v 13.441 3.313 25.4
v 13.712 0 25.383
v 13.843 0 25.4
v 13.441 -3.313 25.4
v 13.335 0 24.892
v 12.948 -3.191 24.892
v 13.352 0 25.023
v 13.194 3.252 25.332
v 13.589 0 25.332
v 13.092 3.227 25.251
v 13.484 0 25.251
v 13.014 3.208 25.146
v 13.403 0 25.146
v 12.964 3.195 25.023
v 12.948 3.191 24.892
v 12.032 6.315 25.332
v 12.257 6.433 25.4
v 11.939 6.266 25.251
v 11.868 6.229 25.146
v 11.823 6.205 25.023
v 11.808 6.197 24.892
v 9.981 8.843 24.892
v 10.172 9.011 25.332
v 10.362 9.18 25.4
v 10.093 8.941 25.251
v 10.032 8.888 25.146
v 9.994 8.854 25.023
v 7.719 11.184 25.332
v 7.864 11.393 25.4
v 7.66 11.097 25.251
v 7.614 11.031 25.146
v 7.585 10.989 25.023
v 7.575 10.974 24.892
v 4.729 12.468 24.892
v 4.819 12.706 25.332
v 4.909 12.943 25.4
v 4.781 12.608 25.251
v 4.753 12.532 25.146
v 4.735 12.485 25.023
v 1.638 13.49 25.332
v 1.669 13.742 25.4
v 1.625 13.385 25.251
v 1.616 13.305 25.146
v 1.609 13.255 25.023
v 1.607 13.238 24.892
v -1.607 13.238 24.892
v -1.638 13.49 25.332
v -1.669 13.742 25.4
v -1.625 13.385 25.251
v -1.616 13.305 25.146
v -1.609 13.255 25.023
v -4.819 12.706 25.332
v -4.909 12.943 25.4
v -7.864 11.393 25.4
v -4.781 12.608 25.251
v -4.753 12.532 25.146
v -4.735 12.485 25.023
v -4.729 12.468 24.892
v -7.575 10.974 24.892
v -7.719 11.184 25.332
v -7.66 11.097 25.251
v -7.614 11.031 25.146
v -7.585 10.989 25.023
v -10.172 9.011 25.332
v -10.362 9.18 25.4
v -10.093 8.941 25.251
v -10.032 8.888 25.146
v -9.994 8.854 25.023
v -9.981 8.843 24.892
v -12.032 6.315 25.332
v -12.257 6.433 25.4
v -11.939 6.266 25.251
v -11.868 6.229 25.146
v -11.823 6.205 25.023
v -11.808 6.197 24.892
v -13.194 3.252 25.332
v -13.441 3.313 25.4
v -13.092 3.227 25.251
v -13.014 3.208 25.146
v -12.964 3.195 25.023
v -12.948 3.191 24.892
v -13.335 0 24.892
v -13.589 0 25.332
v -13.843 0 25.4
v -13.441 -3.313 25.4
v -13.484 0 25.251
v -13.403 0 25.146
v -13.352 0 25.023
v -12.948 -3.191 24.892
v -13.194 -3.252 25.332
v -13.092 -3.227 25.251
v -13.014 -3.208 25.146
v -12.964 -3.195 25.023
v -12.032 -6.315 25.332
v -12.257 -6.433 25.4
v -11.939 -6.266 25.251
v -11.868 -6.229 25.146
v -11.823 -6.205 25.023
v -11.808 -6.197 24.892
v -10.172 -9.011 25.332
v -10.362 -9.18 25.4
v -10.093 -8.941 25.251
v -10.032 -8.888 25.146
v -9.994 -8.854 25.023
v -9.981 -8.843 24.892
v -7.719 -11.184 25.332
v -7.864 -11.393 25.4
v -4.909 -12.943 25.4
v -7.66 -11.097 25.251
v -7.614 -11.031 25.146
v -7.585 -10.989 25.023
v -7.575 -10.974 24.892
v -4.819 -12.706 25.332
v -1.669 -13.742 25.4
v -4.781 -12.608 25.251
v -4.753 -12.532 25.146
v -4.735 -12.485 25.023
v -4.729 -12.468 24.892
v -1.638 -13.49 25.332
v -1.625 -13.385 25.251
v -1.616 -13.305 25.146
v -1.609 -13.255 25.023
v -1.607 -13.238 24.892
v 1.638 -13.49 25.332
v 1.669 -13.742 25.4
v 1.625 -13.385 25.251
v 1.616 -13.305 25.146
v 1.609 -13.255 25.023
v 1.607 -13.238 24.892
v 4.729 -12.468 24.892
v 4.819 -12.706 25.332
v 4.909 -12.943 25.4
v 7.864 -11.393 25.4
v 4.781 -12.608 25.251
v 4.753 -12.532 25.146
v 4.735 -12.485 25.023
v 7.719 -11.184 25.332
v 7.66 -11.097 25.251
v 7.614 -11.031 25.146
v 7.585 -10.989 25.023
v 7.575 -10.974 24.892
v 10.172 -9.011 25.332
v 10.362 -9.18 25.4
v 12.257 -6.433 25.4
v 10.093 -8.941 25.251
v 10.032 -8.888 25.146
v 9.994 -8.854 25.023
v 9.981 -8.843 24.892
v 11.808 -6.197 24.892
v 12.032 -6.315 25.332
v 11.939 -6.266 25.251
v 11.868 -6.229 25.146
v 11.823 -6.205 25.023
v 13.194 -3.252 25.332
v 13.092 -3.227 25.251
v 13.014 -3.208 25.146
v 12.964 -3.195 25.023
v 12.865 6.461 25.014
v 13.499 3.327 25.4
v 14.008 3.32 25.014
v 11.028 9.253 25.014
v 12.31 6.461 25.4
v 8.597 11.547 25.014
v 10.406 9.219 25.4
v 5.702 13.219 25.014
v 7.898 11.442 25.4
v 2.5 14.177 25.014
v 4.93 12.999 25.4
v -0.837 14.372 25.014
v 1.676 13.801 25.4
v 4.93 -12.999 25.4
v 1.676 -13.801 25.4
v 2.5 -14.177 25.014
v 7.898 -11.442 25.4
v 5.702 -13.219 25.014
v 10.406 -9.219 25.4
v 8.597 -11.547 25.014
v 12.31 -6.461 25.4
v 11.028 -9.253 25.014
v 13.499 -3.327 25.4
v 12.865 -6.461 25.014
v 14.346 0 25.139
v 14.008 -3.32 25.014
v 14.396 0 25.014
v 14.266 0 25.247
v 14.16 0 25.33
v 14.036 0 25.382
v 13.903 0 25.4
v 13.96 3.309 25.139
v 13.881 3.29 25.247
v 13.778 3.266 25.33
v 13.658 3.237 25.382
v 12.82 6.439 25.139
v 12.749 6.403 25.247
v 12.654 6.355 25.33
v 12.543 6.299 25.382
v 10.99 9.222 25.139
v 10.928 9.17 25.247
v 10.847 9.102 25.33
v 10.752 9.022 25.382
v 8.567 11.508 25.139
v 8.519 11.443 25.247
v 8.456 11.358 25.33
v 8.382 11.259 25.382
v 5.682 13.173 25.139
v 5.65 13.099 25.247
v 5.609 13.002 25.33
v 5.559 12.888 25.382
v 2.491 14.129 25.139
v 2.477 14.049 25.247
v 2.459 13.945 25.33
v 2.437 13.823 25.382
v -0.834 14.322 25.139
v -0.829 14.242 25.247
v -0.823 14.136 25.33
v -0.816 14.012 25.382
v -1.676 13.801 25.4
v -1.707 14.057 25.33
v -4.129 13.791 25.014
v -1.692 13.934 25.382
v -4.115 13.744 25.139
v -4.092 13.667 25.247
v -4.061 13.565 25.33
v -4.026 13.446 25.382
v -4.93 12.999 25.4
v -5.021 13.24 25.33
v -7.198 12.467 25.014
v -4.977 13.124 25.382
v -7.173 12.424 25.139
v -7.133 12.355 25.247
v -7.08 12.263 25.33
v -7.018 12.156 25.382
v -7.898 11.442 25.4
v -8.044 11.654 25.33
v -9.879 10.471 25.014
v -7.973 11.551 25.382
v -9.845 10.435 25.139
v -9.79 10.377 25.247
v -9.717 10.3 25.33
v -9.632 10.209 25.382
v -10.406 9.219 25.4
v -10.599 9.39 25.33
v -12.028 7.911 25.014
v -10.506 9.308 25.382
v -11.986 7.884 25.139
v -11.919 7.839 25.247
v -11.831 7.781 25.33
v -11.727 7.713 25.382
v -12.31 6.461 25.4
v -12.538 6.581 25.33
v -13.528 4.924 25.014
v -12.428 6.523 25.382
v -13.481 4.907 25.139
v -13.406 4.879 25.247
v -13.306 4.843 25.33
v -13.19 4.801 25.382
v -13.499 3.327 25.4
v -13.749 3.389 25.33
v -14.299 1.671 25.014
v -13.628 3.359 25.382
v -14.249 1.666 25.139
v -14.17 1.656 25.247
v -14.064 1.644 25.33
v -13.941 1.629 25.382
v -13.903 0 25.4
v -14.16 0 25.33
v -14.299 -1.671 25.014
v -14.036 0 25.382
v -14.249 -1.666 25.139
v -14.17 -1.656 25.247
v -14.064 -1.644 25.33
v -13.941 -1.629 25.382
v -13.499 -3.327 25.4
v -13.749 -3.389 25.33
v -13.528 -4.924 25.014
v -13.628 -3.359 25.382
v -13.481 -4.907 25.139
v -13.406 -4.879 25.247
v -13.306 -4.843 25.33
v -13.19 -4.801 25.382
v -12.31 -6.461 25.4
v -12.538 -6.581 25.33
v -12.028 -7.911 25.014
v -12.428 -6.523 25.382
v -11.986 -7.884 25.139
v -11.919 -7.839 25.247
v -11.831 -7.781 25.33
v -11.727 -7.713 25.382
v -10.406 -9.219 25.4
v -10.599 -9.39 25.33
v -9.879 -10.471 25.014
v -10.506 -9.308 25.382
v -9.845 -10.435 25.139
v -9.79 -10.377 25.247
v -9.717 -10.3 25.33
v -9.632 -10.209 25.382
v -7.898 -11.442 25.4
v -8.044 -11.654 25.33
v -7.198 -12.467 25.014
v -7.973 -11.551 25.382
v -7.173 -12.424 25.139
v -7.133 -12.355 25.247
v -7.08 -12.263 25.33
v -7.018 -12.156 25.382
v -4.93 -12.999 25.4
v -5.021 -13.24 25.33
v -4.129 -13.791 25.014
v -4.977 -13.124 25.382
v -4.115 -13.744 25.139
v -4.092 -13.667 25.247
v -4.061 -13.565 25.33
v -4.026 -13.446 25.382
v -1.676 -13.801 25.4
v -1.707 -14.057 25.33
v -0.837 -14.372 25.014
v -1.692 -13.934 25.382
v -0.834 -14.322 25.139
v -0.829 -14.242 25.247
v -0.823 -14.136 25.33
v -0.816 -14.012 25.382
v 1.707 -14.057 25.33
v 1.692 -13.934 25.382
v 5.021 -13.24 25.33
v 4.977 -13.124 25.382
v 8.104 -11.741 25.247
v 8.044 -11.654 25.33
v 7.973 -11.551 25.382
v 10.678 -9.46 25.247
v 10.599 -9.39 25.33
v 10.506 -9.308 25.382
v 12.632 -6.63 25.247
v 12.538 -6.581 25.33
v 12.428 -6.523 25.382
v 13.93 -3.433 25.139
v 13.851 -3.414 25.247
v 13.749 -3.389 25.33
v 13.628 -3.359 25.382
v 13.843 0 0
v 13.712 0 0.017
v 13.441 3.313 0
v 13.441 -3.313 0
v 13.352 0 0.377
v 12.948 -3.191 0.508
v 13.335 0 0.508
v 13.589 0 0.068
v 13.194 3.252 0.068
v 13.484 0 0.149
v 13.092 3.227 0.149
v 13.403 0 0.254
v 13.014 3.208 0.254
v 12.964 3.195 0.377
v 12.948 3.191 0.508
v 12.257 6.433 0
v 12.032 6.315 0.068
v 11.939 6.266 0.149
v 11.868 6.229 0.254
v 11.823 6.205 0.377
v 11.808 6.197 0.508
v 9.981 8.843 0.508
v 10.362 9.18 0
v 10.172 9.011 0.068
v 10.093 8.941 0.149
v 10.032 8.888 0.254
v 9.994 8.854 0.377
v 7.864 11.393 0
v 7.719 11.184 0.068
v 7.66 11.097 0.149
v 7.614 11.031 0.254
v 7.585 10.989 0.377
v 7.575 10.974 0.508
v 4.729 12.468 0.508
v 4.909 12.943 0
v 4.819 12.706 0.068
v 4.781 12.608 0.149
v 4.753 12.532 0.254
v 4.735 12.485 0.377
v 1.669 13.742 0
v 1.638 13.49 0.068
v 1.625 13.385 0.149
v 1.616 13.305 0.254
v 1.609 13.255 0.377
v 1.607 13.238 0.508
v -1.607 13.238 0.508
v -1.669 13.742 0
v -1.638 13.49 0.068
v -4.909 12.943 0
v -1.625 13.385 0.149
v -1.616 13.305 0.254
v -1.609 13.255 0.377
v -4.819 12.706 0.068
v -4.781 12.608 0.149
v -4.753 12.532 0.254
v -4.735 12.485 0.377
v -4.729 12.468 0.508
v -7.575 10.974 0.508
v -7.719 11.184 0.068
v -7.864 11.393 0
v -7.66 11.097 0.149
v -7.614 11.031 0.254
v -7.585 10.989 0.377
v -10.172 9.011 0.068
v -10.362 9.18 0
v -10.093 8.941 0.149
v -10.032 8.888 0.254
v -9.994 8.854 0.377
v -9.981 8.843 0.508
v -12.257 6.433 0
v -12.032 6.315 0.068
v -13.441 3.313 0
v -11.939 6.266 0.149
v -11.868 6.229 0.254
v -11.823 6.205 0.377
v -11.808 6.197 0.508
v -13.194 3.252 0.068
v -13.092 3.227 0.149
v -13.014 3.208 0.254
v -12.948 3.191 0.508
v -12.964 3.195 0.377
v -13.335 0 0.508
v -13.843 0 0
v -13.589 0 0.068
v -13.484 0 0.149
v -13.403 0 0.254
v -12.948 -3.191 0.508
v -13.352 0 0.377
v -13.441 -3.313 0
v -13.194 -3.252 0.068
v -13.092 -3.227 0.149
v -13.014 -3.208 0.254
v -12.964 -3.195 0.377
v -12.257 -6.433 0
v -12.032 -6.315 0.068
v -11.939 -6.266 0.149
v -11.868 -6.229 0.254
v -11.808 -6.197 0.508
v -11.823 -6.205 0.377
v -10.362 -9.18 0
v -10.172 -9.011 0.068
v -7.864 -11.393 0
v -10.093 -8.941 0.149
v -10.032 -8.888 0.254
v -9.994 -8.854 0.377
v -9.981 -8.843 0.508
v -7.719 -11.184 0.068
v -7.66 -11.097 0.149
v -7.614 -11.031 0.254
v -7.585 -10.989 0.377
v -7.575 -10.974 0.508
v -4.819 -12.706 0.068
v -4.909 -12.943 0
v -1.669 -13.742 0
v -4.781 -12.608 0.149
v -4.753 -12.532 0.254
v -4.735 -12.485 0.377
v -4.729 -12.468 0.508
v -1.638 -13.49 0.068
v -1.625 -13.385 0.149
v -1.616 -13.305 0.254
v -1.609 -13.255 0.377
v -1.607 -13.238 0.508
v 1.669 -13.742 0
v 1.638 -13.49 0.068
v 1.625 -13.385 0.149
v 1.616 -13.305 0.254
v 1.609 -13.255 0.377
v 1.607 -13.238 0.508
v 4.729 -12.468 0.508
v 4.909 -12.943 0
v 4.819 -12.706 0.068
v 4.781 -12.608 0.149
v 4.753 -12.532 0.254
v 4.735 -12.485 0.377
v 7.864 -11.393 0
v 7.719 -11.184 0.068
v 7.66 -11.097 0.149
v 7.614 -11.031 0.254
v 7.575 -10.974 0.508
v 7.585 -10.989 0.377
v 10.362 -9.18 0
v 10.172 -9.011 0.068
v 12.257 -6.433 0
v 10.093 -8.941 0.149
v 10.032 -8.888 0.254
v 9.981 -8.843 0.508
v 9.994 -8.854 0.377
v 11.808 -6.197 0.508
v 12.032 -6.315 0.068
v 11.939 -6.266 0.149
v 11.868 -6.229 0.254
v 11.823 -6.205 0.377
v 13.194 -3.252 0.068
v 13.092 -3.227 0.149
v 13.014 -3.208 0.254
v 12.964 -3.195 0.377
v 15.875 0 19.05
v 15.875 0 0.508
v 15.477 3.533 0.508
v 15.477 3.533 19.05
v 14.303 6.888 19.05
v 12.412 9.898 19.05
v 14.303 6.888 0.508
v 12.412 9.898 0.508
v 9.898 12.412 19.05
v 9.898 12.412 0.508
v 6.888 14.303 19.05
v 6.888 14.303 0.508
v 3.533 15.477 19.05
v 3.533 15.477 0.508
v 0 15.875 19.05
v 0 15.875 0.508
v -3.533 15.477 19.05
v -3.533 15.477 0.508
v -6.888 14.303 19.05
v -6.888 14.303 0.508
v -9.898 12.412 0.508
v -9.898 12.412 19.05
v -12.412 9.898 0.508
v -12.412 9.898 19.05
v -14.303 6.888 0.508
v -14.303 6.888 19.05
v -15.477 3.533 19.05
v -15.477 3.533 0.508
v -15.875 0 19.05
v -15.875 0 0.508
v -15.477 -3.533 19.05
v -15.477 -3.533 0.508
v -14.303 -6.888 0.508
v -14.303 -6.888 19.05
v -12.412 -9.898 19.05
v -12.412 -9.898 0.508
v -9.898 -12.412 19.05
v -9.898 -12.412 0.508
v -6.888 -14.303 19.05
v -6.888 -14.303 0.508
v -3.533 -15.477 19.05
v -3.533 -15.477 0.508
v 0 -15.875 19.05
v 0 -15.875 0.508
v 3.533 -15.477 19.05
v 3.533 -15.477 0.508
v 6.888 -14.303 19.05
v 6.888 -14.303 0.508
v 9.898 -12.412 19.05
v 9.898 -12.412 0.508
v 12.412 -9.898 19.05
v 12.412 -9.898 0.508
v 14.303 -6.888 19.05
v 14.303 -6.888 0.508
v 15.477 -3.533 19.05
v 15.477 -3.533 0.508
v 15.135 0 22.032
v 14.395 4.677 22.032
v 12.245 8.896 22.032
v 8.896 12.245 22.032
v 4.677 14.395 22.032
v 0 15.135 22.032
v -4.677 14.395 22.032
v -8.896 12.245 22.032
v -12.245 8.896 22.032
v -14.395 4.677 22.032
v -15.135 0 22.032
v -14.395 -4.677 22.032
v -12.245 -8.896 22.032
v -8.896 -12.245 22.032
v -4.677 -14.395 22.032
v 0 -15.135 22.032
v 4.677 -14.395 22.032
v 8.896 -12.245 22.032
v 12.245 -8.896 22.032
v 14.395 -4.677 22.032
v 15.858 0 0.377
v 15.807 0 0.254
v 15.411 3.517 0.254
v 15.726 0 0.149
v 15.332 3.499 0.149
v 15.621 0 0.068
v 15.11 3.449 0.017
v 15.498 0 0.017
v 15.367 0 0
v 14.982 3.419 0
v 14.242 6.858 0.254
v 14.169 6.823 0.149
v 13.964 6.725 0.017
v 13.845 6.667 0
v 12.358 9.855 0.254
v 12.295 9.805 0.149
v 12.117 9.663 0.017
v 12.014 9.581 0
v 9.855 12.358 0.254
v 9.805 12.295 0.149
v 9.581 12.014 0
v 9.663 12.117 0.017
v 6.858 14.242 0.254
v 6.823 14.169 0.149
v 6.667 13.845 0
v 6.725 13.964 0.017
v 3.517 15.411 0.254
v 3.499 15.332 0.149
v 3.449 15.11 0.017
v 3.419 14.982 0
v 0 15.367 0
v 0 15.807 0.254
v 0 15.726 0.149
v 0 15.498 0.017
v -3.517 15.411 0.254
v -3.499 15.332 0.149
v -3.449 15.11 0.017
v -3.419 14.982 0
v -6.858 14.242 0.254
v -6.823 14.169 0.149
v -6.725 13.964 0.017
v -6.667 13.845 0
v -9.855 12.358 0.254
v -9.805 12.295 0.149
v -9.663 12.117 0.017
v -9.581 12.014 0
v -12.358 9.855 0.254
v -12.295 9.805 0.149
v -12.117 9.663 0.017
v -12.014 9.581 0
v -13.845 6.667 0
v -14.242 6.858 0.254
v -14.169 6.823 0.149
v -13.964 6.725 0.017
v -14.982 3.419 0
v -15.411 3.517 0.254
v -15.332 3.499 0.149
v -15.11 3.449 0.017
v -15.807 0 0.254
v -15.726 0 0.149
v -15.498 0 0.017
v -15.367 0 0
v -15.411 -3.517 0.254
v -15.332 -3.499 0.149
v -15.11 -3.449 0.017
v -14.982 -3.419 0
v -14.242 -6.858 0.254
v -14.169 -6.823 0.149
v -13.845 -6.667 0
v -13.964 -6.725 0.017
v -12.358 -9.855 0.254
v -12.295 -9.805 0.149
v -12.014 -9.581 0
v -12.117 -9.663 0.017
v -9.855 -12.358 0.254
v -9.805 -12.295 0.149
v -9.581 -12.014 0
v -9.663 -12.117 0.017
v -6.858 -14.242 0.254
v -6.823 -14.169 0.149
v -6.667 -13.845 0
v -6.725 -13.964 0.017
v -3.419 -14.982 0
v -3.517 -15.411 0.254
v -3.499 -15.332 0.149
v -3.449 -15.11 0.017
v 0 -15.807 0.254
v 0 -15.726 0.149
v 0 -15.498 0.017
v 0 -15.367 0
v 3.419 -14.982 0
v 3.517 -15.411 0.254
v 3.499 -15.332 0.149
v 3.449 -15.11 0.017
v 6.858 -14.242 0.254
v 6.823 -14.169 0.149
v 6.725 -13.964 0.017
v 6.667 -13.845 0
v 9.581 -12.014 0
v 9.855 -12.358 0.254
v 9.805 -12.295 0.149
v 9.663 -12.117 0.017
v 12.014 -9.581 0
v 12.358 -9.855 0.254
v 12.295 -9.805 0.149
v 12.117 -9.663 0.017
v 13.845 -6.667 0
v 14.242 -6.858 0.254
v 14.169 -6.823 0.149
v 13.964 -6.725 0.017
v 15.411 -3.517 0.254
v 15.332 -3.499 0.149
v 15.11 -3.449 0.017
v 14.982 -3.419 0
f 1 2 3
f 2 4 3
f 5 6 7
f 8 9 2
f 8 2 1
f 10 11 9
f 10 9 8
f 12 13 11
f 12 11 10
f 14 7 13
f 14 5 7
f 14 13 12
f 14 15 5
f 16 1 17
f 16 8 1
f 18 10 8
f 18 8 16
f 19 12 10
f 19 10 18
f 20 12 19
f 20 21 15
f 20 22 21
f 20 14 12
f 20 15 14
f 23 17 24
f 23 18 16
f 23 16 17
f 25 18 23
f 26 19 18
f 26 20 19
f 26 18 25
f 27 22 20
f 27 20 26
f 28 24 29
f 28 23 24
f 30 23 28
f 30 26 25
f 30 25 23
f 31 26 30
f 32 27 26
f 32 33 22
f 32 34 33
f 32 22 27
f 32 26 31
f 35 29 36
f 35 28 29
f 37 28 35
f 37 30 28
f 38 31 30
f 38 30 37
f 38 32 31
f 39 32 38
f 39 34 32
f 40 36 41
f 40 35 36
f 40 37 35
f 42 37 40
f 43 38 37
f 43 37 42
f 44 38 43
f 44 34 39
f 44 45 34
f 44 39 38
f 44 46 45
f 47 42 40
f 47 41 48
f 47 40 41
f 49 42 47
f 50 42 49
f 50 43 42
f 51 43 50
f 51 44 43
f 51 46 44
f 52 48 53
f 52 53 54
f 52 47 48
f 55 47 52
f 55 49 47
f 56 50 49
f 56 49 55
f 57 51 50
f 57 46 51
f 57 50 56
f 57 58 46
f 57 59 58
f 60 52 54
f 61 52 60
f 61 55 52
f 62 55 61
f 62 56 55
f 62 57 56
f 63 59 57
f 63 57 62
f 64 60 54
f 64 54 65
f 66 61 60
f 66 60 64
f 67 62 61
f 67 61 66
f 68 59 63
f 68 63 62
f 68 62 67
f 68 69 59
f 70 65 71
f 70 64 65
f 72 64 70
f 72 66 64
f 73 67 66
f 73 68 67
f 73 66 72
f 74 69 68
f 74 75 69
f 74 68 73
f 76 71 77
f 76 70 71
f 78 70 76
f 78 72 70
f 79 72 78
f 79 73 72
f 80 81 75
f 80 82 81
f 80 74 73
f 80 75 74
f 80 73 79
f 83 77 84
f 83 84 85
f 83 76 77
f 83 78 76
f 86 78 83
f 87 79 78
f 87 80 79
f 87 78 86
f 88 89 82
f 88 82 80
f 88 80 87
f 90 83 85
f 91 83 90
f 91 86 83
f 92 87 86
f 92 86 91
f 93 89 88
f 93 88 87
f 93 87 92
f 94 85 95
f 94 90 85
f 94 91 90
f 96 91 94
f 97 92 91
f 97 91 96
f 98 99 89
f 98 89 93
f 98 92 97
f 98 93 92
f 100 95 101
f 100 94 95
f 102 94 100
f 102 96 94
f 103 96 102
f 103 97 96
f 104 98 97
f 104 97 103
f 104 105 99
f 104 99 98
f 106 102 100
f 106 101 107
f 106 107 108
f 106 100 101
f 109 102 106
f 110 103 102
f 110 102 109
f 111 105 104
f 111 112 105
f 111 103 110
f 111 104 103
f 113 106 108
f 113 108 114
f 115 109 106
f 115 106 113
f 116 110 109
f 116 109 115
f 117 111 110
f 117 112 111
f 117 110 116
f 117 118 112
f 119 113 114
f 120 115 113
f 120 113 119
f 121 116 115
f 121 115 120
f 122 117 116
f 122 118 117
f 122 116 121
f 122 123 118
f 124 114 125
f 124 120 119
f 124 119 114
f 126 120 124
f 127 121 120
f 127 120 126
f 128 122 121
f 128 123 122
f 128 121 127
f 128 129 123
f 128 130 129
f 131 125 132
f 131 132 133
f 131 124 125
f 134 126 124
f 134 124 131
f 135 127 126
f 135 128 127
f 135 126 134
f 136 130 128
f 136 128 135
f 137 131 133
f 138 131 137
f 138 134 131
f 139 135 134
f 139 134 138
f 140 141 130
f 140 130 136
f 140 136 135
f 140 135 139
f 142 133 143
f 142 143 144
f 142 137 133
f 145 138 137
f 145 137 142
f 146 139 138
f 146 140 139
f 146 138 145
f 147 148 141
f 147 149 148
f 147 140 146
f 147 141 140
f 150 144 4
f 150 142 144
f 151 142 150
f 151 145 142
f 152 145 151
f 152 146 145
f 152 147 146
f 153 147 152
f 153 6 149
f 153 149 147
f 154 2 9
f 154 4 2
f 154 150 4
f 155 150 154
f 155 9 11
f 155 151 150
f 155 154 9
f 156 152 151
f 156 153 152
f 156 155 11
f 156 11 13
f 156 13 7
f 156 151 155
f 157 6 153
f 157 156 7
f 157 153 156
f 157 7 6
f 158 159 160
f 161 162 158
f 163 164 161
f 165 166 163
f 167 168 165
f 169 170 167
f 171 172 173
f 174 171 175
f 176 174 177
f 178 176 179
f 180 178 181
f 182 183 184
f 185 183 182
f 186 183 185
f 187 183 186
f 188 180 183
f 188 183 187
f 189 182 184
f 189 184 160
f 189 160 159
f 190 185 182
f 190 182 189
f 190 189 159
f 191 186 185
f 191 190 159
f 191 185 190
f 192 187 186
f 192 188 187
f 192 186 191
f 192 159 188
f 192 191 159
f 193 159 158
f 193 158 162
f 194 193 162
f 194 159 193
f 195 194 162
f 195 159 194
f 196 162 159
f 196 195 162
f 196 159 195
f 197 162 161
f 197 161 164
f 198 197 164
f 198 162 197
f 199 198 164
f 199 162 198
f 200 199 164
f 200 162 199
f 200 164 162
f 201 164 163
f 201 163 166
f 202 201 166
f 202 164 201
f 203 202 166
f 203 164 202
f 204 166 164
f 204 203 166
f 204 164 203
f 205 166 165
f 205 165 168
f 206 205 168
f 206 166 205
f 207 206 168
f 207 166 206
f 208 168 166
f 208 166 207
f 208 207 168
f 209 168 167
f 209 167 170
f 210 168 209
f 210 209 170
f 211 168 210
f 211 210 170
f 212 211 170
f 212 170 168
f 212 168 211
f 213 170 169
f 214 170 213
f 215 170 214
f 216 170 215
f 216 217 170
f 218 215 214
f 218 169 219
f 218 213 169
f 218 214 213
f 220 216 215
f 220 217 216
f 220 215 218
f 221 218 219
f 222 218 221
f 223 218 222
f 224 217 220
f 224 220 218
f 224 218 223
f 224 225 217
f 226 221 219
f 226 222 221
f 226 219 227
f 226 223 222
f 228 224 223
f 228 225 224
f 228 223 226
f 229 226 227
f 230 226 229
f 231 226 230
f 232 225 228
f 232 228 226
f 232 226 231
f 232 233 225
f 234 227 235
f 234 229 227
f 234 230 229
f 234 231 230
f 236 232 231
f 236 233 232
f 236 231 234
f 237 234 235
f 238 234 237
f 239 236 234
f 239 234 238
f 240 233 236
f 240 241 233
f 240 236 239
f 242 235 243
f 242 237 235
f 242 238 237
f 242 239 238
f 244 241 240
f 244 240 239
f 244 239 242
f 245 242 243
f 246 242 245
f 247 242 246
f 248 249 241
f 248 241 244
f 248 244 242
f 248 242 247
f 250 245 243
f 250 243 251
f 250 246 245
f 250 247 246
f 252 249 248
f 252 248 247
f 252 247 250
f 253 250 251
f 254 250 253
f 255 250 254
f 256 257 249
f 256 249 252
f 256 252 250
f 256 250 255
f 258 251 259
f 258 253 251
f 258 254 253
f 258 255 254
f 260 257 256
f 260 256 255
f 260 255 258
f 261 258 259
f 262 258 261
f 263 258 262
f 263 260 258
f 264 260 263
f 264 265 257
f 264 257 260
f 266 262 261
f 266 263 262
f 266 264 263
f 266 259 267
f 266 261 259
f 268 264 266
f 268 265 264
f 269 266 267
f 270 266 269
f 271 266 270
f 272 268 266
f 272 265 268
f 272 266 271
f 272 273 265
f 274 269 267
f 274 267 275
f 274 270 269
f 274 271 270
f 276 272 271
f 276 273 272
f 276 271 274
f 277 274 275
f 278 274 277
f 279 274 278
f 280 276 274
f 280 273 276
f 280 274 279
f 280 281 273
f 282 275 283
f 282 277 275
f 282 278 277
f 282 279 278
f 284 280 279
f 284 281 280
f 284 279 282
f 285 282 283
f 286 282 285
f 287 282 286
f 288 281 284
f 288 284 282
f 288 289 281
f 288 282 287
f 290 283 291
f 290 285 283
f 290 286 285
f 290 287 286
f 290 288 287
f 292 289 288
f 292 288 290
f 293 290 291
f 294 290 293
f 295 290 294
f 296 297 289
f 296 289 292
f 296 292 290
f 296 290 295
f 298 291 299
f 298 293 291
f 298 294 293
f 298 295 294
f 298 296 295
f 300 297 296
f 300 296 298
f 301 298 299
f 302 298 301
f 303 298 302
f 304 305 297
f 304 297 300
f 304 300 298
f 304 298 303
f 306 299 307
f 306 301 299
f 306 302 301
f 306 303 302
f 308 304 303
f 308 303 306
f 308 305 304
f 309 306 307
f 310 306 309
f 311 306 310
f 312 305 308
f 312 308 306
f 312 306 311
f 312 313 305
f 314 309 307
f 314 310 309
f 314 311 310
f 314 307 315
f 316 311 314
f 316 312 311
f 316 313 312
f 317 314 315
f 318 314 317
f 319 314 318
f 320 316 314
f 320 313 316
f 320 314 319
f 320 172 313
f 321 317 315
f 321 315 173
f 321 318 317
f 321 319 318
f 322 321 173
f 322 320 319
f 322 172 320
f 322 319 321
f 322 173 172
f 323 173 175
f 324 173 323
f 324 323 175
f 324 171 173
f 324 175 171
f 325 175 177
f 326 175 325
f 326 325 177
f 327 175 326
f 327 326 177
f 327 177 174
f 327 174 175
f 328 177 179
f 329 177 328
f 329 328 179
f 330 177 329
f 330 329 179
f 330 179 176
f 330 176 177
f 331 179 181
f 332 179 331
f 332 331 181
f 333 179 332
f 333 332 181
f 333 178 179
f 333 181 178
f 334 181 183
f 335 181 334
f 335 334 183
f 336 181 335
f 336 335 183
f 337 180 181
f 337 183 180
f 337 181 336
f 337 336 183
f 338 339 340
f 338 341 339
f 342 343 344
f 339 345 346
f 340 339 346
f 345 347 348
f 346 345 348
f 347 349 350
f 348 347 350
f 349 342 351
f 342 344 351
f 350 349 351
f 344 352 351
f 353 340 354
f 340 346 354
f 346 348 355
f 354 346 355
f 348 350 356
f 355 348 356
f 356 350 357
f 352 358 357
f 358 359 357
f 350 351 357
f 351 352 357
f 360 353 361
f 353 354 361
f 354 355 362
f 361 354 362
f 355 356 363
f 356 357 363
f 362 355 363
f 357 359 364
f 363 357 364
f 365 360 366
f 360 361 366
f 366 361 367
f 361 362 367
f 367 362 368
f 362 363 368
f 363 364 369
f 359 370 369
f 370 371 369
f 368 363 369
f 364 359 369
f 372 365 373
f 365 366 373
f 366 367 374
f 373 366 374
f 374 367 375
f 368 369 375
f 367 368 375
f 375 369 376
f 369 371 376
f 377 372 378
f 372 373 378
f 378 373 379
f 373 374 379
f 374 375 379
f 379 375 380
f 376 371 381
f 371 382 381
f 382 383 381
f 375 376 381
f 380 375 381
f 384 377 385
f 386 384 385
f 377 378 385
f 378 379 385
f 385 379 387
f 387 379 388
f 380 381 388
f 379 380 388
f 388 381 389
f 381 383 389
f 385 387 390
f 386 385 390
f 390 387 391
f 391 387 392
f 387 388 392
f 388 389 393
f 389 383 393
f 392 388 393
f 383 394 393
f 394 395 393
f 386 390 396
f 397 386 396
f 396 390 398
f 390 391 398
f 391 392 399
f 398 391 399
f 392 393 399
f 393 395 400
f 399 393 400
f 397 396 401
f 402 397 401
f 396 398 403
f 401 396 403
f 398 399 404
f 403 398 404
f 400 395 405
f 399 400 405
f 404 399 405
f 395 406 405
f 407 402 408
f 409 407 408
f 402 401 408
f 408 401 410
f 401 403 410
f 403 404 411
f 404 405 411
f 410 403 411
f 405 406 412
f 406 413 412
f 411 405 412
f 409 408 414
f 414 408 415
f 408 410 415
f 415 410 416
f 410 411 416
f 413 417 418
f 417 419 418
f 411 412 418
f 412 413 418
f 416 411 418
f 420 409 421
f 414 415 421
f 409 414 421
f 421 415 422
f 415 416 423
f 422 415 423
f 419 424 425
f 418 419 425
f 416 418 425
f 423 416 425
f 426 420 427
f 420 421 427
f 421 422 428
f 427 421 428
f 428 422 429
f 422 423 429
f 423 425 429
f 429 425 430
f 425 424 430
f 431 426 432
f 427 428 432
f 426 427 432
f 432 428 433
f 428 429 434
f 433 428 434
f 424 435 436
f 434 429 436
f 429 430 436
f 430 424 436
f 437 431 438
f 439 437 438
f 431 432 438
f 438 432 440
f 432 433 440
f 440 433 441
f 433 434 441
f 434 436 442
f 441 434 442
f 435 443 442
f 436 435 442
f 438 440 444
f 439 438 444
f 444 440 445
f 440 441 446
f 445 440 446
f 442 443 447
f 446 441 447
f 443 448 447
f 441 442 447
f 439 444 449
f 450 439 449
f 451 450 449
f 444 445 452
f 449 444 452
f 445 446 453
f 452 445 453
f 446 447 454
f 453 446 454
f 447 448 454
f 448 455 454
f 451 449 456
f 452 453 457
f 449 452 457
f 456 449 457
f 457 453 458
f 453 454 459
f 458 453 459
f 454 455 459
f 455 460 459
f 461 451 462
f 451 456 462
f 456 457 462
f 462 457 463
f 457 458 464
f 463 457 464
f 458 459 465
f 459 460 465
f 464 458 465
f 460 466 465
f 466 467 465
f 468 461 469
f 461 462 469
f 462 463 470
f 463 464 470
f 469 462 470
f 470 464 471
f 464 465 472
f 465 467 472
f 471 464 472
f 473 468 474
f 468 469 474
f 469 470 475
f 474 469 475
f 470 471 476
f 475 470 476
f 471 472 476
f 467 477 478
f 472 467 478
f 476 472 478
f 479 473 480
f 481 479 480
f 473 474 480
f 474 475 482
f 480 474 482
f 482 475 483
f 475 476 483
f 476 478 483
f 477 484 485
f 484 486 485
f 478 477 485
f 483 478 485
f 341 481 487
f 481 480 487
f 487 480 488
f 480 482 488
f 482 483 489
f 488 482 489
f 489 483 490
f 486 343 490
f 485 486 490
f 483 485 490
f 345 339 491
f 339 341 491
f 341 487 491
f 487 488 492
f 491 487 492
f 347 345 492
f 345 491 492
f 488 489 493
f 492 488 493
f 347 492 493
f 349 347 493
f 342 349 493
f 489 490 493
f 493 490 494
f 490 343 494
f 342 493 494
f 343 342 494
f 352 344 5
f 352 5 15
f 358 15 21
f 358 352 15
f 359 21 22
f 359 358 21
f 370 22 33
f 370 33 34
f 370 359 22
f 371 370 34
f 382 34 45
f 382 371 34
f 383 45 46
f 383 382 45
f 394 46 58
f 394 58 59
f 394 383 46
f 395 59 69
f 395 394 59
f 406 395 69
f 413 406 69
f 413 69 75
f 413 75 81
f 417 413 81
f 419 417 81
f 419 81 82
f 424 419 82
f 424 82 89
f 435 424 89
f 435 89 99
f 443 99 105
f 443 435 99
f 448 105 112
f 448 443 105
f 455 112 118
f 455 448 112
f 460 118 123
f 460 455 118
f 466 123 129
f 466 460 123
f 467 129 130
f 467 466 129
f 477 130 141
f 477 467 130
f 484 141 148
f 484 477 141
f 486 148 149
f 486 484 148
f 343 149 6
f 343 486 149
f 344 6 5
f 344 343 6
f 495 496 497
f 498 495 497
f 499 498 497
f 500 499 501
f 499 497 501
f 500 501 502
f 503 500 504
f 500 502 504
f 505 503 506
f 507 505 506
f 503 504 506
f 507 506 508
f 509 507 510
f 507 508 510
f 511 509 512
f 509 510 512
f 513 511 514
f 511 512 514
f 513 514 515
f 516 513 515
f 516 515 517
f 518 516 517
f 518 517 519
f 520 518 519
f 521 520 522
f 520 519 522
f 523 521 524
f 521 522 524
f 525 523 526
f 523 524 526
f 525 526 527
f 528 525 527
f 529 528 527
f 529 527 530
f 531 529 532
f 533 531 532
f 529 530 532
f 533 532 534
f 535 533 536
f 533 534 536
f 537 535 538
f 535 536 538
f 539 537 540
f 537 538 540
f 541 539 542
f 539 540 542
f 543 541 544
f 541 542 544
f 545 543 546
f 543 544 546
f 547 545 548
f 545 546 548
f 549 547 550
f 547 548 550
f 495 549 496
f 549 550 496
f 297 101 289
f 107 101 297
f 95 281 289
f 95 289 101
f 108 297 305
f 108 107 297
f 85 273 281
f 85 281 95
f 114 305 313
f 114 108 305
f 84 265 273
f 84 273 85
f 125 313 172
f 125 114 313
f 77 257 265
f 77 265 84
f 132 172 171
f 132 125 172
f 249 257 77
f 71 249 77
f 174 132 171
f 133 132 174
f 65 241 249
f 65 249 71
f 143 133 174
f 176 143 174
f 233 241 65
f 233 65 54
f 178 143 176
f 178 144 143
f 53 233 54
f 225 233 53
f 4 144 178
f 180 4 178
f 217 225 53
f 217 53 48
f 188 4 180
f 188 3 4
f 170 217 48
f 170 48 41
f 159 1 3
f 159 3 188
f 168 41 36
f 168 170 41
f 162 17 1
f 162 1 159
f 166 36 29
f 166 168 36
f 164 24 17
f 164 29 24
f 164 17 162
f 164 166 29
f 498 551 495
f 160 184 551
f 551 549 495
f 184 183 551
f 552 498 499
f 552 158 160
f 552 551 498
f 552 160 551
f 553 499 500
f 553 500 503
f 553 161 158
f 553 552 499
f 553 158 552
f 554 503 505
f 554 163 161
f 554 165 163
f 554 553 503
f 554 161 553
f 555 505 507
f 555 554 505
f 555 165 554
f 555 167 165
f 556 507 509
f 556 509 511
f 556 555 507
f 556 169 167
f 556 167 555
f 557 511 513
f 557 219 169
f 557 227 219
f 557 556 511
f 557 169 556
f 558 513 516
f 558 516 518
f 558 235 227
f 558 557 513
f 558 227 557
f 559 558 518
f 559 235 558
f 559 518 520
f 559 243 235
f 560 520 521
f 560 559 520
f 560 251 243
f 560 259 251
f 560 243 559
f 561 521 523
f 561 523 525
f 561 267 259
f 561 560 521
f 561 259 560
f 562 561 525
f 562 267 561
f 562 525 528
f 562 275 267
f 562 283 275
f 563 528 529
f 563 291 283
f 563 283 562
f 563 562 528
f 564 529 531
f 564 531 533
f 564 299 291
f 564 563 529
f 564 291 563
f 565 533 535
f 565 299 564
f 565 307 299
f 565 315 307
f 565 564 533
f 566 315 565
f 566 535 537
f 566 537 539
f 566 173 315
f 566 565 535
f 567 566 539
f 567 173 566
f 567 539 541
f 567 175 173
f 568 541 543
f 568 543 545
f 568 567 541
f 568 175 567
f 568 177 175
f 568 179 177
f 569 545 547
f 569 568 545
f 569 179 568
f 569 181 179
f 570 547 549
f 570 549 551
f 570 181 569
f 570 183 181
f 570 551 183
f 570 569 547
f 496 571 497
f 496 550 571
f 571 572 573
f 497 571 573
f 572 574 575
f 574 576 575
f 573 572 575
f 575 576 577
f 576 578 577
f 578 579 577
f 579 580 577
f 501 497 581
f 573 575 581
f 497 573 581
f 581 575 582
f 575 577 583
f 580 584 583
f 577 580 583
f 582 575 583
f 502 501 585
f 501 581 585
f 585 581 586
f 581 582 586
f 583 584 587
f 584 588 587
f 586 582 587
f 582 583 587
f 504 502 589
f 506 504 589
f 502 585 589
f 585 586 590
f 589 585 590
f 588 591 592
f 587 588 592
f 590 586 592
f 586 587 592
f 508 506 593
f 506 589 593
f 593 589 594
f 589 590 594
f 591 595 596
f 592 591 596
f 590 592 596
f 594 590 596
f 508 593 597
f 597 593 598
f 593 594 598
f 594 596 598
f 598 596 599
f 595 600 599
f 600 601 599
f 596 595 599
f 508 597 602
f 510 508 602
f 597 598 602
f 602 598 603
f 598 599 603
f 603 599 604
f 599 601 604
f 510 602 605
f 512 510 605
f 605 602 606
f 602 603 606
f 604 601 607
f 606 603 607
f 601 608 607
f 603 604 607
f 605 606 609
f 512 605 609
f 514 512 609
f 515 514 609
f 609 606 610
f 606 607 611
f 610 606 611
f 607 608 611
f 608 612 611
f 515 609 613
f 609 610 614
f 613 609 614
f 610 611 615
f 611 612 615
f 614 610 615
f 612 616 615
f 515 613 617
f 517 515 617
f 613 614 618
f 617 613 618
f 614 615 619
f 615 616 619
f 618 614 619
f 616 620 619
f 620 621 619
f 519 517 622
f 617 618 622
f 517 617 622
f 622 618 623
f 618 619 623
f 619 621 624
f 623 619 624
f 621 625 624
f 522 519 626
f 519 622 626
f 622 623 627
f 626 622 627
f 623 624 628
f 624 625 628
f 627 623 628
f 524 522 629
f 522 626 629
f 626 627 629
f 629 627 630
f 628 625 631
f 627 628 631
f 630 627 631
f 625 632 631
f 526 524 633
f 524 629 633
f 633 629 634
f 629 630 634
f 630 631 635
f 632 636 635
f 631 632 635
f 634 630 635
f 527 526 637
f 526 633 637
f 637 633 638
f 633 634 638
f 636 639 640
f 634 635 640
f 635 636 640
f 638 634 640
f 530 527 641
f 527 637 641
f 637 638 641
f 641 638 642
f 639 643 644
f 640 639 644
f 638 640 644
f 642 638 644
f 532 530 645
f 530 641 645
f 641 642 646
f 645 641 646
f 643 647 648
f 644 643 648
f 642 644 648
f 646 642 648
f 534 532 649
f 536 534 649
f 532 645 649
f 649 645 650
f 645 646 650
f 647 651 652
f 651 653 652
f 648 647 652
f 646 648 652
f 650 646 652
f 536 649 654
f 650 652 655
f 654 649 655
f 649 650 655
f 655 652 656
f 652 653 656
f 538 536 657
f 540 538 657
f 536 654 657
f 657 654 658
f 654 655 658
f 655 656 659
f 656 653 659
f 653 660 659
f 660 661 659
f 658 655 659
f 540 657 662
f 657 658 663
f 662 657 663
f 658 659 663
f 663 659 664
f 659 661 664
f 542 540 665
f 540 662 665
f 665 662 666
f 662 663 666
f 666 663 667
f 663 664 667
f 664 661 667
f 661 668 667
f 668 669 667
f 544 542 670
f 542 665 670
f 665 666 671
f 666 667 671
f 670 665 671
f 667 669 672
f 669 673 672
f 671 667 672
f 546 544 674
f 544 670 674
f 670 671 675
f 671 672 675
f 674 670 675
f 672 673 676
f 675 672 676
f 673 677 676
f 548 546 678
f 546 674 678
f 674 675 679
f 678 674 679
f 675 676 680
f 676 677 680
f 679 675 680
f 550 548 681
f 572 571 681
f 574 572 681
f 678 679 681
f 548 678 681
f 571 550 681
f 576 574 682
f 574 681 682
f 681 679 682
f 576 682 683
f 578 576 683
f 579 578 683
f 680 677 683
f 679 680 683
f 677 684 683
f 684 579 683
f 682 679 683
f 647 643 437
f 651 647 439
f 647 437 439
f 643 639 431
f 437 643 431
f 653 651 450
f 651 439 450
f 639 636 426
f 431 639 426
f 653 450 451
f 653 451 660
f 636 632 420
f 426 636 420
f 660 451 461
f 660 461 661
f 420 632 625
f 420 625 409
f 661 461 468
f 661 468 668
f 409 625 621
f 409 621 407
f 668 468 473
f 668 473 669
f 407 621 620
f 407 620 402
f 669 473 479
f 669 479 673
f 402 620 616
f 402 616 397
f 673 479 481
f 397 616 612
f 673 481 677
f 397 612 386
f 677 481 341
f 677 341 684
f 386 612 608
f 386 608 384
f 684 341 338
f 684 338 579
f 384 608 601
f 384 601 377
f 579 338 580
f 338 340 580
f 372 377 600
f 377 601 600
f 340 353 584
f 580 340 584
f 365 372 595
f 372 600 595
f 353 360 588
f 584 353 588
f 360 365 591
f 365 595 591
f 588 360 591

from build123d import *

# Parameters (mm, degrees)
F0_R     = 15.875
F0_R_2   = 13.335
F1_DEPTH = 25.4
F2_SIZE2 = 1.5748
F2_SIZE  = 6.35
F3_R     = 0.508


with BuildPart() as f1:
    # F0 (on Top) → F1 (new body)
    with BuildSketch(Plane.XY):
        Circle(F0_R)
        Circle(F0_R_2, mode=Mode.SUBTRACT)
    extrude(amount=F1_DEPTH)

    # F2
    f2_edges = [f1.edges().sort_by_distance(p)[0] for p in [
        (-15.875, 0, 25.4),
    ]]
    f2_side = f1.faces().sort_by_distance((-15.875, 0, 12.7))[0]
    chamfer(f2_edges, length=F2_SIZE, length2=F2_SIZE2, reference=f2_side)

    # F3
    f3_edges = [f1.edges().sort_by_distance(p)[0] for p in [
        (-14.3002, 0, 25.4),
        (-13.335, 0, 25.4),
        (-15.875, 0, 0),
        (-13.335, 0, 0),
    ]]
    fillet(f3_edges, radius=F3_R)


solid = f1.part
